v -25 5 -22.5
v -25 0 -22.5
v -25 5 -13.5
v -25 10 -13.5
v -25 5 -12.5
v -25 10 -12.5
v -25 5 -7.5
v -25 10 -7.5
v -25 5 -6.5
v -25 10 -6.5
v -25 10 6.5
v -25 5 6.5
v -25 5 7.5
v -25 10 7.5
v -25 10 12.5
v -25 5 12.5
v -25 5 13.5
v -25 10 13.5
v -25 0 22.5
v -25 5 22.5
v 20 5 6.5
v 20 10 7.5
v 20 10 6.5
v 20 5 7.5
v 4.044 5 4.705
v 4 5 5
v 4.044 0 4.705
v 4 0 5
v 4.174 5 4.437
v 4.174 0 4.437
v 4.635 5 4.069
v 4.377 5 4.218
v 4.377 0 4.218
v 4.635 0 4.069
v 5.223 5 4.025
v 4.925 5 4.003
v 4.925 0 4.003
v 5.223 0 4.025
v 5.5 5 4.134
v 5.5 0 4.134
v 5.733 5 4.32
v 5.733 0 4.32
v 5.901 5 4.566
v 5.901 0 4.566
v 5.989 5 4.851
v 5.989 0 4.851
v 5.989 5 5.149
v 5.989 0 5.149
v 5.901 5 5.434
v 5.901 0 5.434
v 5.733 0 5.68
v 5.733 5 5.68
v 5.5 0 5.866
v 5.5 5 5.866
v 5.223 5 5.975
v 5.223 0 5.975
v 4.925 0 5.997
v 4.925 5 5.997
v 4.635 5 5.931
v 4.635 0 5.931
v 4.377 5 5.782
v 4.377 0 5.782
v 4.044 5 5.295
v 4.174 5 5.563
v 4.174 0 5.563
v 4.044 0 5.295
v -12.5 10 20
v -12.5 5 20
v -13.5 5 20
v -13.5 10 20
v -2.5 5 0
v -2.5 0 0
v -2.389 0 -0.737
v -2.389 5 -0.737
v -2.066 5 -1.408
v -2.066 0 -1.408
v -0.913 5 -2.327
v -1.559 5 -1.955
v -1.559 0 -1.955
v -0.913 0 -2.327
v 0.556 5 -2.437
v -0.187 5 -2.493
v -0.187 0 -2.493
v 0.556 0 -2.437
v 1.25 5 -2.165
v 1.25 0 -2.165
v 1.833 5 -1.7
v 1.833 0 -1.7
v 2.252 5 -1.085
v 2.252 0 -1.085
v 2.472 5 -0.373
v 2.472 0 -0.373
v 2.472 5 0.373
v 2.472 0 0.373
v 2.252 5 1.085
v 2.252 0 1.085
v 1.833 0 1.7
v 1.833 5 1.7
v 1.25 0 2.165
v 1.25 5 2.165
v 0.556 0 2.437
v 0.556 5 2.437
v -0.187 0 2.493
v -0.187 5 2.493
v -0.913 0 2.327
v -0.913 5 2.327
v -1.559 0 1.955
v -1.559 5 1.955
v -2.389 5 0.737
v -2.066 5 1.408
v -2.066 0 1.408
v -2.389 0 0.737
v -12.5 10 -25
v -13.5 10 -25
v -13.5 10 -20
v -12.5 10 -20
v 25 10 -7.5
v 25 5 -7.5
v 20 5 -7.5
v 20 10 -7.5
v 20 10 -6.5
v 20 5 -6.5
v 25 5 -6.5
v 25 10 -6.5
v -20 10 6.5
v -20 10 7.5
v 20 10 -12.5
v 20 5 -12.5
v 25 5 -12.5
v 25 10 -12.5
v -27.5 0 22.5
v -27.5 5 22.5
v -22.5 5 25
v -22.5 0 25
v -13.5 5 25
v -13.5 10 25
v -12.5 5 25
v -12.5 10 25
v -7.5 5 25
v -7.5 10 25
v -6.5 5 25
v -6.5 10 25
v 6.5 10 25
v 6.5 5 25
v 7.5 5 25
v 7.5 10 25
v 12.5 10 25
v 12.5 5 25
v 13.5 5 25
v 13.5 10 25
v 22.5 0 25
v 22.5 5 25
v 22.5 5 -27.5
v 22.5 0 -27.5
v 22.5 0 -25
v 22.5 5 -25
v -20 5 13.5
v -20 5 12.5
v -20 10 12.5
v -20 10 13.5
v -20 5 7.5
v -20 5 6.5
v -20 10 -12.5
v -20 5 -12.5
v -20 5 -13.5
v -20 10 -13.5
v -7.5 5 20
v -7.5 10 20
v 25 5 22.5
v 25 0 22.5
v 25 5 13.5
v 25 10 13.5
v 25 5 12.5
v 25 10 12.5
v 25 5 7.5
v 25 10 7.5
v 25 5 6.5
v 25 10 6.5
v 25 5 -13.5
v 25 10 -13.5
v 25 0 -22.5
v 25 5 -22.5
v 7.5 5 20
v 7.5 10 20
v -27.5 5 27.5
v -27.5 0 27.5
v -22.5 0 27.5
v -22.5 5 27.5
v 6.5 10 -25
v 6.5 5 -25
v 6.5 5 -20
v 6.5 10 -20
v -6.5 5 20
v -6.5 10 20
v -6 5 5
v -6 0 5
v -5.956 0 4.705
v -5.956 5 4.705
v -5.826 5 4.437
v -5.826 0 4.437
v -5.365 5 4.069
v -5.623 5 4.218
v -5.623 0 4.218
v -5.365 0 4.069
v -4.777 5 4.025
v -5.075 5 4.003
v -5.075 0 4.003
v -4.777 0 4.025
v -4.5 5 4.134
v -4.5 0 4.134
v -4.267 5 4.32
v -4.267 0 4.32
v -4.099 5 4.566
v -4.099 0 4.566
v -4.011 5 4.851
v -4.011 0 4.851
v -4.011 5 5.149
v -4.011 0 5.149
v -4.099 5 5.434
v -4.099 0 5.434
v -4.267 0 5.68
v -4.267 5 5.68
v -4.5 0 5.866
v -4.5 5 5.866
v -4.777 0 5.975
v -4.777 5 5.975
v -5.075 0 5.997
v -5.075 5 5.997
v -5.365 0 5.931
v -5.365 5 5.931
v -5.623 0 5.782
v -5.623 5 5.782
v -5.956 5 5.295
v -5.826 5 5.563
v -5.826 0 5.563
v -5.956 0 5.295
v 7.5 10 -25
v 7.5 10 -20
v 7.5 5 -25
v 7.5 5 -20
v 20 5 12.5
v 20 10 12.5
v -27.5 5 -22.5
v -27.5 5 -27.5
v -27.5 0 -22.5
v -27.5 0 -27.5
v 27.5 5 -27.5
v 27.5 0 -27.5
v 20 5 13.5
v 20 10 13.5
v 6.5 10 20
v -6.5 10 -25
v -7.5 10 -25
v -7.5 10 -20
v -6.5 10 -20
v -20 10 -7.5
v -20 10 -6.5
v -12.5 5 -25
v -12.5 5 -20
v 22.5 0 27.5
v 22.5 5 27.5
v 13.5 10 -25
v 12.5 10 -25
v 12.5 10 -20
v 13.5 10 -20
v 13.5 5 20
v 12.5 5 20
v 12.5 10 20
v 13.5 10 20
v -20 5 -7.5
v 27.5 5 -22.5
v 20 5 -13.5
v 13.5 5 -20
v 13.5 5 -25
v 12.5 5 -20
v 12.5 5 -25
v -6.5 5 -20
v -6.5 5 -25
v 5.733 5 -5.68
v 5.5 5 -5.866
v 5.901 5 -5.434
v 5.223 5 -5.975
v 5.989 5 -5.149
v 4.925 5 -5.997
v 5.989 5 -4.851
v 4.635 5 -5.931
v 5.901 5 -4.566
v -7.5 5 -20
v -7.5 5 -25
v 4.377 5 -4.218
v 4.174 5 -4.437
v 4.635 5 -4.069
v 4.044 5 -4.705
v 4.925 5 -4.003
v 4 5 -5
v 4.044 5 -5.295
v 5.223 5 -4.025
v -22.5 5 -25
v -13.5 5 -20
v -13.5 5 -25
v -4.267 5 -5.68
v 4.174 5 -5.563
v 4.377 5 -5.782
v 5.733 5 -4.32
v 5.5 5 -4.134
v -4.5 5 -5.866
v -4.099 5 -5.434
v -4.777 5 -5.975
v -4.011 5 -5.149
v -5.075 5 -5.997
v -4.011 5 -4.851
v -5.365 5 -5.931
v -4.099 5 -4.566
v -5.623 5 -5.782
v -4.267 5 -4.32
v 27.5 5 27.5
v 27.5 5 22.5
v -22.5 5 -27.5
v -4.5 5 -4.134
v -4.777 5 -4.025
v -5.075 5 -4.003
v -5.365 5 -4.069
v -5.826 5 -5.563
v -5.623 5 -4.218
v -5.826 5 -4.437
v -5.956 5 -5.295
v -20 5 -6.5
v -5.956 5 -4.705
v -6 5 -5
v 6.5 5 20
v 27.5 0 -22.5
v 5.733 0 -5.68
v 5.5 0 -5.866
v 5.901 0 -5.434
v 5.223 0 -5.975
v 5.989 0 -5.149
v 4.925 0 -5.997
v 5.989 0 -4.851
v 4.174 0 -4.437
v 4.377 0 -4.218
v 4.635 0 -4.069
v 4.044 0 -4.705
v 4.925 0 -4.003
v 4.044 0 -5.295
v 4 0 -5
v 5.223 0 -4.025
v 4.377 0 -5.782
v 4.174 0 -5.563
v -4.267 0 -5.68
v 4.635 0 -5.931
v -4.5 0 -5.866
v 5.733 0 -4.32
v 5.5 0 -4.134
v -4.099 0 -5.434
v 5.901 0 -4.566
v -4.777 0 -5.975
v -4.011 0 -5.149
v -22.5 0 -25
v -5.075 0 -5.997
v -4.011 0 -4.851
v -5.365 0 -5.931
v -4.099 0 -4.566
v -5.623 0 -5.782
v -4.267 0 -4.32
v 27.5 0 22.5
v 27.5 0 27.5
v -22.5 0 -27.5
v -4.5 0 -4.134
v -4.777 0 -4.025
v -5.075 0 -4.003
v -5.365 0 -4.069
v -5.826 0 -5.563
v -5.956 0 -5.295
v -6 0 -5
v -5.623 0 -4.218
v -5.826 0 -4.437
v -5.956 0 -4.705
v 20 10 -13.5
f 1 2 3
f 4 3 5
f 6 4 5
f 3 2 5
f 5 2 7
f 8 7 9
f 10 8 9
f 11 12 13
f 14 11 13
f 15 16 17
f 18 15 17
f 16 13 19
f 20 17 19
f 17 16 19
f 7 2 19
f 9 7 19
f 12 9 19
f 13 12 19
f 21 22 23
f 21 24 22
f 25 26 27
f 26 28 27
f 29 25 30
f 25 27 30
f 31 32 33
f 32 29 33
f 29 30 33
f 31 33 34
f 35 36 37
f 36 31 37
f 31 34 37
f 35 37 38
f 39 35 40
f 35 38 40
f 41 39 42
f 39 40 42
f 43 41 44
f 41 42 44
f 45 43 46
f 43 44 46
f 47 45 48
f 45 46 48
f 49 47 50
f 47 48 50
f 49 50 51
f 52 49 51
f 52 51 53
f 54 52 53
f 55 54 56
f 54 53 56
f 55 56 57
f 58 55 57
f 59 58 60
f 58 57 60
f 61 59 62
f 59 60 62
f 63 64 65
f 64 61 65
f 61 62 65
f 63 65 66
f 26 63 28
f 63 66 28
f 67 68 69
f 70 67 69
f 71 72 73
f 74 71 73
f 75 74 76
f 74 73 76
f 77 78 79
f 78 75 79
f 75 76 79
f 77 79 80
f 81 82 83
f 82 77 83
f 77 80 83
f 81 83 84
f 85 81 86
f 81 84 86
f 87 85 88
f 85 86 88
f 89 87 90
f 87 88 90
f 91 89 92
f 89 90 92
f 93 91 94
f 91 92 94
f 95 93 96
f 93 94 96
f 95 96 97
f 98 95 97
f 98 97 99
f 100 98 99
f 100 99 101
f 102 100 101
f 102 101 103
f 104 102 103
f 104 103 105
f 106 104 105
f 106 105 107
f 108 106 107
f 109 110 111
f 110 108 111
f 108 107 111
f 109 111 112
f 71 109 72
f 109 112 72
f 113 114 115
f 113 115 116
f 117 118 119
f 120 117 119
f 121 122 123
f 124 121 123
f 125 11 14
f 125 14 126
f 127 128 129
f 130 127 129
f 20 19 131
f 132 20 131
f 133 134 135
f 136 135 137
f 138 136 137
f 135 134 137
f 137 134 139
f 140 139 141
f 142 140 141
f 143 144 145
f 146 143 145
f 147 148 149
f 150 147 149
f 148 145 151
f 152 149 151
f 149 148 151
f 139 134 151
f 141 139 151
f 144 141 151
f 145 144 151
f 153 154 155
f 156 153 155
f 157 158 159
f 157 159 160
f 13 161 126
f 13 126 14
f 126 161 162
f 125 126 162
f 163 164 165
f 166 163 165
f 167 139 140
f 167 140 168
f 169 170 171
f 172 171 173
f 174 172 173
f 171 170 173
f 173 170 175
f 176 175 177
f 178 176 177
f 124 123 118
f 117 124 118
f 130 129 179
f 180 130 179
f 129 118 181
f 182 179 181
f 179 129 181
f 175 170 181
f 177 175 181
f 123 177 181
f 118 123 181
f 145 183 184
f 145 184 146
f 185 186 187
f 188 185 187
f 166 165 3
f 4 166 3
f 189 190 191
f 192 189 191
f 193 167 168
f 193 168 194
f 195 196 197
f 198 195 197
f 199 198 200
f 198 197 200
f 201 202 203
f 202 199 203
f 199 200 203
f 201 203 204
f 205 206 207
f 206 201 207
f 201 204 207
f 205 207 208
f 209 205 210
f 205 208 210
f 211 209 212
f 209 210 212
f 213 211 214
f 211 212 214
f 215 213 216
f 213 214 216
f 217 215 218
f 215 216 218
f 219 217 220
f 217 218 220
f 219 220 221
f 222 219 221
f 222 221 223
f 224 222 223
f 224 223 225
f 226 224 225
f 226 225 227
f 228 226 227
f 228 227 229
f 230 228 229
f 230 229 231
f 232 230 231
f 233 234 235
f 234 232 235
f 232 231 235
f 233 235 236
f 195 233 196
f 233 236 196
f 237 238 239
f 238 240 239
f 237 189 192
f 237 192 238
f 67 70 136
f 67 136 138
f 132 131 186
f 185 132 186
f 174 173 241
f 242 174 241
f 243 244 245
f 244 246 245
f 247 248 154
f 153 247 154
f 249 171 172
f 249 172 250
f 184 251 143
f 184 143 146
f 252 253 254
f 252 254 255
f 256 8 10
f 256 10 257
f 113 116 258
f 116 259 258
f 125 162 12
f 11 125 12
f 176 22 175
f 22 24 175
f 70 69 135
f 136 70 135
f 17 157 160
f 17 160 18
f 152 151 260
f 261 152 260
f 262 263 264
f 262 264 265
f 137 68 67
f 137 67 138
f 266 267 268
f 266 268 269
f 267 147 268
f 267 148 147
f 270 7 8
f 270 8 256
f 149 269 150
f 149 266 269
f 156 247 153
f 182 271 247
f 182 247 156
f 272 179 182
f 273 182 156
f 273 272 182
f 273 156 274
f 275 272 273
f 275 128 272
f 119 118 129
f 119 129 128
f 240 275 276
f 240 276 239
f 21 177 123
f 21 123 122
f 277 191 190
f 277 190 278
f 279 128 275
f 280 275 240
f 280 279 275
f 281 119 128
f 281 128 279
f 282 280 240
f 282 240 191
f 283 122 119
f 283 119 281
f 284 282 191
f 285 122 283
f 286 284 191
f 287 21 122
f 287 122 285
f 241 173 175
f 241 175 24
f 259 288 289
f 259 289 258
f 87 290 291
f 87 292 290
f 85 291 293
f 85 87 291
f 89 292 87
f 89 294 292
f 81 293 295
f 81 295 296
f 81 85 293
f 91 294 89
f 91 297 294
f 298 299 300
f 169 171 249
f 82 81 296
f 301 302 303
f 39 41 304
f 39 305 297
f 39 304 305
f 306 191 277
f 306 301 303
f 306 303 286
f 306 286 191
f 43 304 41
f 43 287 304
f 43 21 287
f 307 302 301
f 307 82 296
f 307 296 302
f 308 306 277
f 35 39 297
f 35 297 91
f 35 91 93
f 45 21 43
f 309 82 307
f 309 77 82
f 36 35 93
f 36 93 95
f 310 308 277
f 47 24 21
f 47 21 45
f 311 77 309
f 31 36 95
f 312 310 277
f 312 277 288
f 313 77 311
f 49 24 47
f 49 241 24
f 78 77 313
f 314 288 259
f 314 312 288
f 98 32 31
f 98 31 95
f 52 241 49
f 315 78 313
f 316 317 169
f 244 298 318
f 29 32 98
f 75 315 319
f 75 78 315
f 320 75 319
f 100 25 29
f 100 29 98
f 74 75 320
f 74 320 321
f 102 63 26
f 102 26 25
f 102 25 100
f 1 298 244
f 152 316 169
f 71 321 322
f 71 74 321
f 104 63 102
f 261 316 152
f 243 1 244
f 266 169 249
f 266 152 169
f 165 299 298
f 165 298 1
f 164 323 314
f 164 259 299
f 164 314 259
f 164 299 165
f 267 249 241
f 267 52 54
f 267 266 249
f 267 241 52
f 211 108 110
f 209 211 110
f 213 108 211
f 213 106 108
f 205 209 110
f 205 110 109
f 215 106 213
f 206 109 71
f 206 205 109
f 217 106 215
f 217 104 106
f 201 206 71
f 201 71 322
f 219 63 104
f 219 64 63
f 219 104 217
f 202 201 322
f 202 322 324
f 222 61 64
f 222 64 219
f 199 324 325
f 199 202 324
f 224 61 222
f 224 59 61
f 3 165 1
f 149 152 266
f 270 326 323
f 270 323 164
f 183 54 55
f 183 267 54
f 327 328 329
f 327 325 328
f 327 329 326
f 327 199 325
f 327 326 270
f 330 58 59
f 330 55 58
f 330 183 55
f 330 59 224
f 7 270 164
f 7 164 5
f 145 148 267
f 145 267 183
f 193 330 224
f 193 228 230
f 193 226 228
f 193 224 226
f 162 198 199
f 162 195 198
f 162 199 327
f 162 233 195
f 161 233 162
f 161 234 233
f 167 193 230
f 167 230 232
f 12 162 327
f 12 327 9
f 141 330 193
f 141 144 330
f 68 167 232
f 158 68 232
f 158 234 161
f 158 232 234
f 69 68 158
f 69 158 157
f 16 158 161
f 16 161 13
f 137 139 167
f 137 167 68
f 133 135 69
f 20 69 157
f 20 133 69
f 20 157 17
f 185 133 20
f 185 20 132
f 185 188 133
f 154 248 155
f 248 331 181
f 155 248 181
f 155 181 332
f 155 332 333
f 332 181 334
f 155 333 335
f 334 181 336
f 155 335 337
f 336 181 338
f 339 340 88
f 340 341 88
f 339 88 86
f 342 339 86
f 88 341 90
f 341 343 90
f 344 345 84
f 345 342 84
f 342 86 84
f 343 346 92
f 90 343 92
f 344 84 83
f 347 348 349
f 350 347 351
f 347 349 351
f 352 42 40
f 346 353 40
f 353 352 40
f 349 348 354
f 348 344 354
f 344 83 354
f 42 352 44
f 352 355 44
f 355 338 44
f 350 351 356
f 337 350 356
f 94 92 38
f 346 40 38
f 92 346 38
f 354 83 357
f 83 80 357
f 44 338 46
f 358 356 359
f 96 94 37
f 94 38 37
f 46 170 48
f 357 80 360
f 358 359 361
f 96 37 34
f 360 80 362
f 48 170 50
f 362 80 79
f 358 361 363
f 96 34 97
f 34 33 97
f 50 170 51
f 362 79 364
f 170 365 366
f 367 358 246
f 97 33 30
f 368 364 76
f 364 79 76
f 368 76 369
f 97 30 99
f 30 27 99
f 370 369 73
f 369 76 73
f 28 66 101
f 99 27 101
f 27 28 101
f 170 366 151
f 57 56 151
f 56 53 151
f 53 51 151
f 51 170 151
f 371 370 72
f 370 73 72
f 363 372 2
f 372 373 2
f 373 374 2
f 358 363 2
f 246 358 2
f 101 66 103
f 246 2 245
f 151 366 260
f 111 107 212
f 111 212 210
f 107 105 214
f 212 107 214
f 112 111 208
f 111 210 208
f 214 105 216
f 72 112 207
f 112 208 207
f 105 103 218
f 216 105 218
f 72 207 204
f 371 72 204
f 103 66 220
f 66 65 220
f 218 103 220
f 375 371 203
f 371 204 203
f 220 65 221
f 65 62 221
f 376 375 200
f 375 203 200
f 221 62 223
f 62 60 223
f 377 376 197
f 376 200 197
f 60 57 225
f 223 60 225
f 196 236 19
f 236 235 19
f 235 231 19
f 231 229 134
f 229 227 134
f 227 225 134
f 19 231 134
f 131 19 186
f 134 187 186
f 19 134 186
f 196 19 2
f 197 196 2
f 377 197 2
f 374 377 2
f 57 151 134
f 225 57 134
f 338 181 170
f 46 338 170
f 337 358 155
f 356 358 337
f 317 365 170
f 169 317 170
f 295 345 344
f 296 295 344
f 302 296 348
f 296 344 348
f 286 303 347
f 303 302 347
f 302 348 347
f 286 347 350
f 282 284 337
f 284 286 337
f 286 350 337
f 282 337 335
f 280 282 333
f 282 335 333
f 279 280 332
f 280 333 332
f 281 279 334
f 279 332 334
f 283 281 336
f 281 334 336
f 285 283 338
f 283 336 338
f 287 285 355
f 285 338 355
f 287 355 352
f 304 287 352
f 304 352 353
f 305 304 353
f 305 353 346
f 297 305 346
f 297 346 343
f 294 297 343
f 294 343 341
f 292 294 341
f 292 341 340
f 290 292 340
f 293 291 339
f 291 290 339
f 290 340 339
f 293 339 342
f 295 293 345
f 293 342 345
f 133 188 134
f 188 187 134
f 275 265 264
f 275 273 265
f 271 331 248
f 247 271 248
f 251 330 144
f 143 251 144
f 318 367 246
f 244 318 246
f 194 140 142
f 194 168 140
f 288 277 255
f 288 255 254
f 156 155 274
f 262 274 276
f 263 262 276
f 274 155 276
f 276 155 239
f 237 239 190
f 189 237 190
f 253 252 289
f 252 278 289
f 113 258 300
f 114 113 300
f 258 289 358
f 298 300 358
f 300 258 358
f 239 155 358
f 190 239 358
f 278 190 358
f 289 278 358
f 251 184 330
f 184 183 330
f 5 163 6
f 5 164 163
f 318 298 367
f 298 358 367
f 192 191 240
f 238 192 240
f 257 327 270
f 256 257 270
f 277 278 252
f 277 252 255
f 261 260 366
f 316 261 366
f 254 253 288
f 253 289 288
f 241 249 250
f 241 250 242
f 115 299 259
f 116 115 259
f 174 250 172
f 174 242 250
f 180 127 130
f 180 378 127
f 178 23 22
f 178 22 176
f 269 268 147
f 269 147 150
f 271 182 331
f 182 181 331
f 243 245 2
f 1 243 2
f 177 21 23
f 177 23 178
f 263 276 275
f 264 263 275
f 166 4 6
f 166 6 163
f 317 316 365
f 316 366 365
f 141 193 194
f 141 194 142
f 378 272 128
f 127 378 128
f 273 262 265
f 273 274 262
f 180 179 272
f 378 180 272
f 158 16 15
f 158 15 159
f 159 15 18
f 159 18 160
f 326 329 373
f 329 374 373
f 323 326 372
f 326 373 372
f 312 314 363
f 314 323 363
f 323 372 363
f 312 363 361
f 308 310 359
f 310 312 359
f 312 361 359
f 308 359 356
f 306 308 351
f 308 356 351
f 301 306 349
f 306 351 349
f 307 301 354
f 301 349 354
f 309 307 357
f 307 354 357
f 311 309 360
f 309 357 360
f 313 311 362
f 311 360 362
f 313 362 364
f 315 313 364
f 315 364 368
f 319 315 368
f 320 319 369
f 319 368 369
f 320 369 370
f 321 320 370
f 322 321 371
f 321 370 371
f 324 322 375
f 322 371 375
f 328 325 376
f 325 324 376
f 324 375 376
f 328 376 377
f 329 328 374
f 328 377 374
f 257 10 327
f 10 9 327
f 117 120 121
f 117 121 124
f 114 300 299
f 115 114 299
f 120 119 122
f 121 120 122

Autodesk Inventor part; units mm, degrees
ref_plane "YZ Plane" through (0, 0, 0) normal (1, 0, 0) x (0, 1, 0)
ref_plane "XZ Plane" through (0, 0, 0) normal (0, 1, 0) x (-1, 0, 0)
ref_plane "XY Plane" through (0, 0, 0) normal (0, 0, 1) x (1, 0, 0)
sketch "Sketch1" plane through (0, 0, 0) normal (0, 1, 0) x (-1, 0, 0)
  line L0 (-25, -25) -> (25, -25)
  line L1 (25, -25) -> (25, 25)
  line L2 (25, 25) -> (-25, 25)
  line L3 (-25, 25) -> (-25, -25)
  line L4 (-25, -25) -> (25, 25) construction
  line L5 (25, -25) -> (-25, 25) construction
  circle A0 centre (0, 0) radius 2.5
  line L6 (-22.5, -22.5) -> (-27.5, -22.5)
  line L7 (-27.5, -22.5) -> (-27.5, -27.5)
  line L8 (-27.5, -27.5) -> (-22.5, -27.5)
  line L9 (-22.5, -27.5) -> (-22.5, -22.5)
  line L10 (-22.5, -22.5) -> (-27.5, -27.5) construction
  line L11 (-27.5, -22.5) -> (-22.5, -27.5) construction
  line L12 (27.5, -22.5) -> (22.5, -22.5)
  line L13 (22.5, -22.5) -> (22.5, -27.5)
  line L14 (22.5, -27.5) -> (27.5, -27.5)
  line L15 (27.5, -27.5) -> (27.5, -22.5)
  line L16 (27.5, -22.5) -> (22.5, -27.5) construction
  line L17 (22.5, -22.5) -> (27.5, -27.5) construction
  line L18 (27.5, 27.5) -> (22.5, 27.5)
  line L19 (22.5, 27.5) -> (22.5, 22.5)
  line L20 (22.5, 22.5) -> (27.5, 22.5)
  line L21 (27.5, 22.5) -> (27.5, 27.5)
  line L22 (27.5, 27.5) -> (22.5, 22.5) construction
  line L23 (22.5, 27.5) -> (27.5, 22.5) construction
  line L24 (-22.5, 27.5) -> (-27.5, 27.5)
  line L25 (-27.5, 27.5) -> (-27.5, 22.5)
  line L26 (-27.5, 22.5) -> (-22.5, 22.5)
  line L27 (-22.5, 22.5) -> (-22.5, 27.5)
  line L28 (-22.5, 27.5) -> (-27.5, 22.5) construction
  line L29 (-27.5, 27.5) -> (-22.5, 22.5) construction
  circle A1 centre (5, -5) radius 1
  circle A2 centre (5, 5) radius 1
  circle A3 centre (-5, 5) radius 1
  circle A4 centre (-5, -5) radius 1
  point P0 (25, -22.5)
  point P1 (22.5, -25)
  point P2 (-22.5, -25)
  point P3 (-25, -22.5)
  point P4 (-25, 22.5)
  point P5 (-22.5, 25)
  point P6 (22.5, 25)
  point P7 (25, 22.5)
  point P8 (0, -25)
  point P9 (25, 0)
  point P10 (0, 25)
  point P11 (-25, 0)
  dimension "d0" = 50
  dimension "d1" = 50
  dimension "d45" = 5
  dimension "d46" = 5
  dimension "d47" = 5
  dimension "d48" = 5
  dimension "d49" = 5
  dimension "d50" = 5
  dimension "d51" = 5
  dimension "d52" = 5
  dimension "d53" = 5
  dimension "d82" = 2
  dimension "d83" = 2
  dimension "d84" = 2
  dimension "d85" = 2
  dimension "d86" = 5
  dimension "d87" = 5
  dimension "d88" = 5
  dimension "d89" = 5
  dimension "d90" = 5
  dimension "d91" = 5
  dimension "d92" = 5
  dimension "d93" = 5
extrude "Extrusion1" add sketch "Sketch1" along normal blind 5
sketch "Sketch2" plane through (0, 5, 0) normal (0, 1, 0) x (1, 0, 0)
  line L0 (-25, 22.5) -> (-25, -22.5) projected
  line L1 (-22.5, -25) -> (22.5, -25) projected
  line L2 (25, -22.5) -> (25, 22.5) projected
  line L3 (22.5, 25) -> (-22.5, 25) projected
  line L4 (25, -12.5) -> (20, -12.5)
  line L5 (20, -12.5) -> (20, -7.5)
  line L6 (20, -7.5) -> (25, -7.5)
  line L7 (25, -7.5) -> (25, -12.5)
  line L8 (25, -22.5) -> (25, 22.5) projected
  line L9 (25, 7.5) -> (20, 7.5)
  line L10 (20, 7.5) -> (20, 12.5)
  line L11 (20, 12.5) -> (25, 12.5)
  line L12 (25, 12.5) -> (25, 7.5)
  line L13 (-25, -12.5) -> (-20, -12.5)
  line L14 (-20, -12.5) -> (-20, -7.5)
  line L15 (-20, -7.5) -> (-25, -7.5)
  line L16 (-25, -7.5) -> (-25, -12.5)
  line L17 (-25, 22.5) -> (-25, -22.5) projected
  line L18 (-25, 7.5) -> (-20, 7.5)
  line L19 (-20, 7.5) -> (-20, 12.5)
  line L20 (-20, 12.5) -> (-25, 12.5)
  line L21 (-25, 12.5) -> (-25, 7.5)
  line L22 (-22.5, -25) -> (22.5, -25) projected
  line L23 (-25, 12.5) -> (-20, 12.5)
  line L24 (-20, 12.5) -> (-20, 13.5)
  line L25 (-20, 13.5) -> (-25, 13.5)
  line L26 (-25, 13.5) -> (-25, 12.5)
  line L27 (20, 12.5) -> (25, 12.5)
  line L28 (25, 12.5) -> (25, 13.5)
  line L29 (25, 13.5) -> (20, 13.5)
  line L30 (20, 13.5) -> (20, 12.5)
  line L31 (25, 7.5) -> (20, 7.5)
  line L32 (20, 7.5) -> (20, 6.5)
  line L33 (20, 6.5) -> (25, 6.5)
  line L34 (25, 6.5) -> (25, 7.5)
  line L35 (-20, 7.5) -> (-25, 7.5)
  line L36 (-25, 7.5) -> (-25, 6.5)
  line L37 (-25, 6.5) -> (-20, 6.5)
  line L38 (-20, 6.5) -> (-20, 7.5)
  line L39 (-25, -7.5) -> (-20, -7.5)
  line L40 (-20, -7.5) -> (-20, -6.5)
  line L41 (-20, -6.5) -> (-25, -6.5)
  line L42 (-25, -6.5) -> (-25, -7.5)
  line L43 (-25, -12.5) -> (-20, -12.5)
  line L44 (-20, -12.5) -> (-20, -13.5)
  line L45 (-20, -13.5) -> (-25, -13.5)
  line L46 (-25, -13.5) -> (-25, -12.5)
  line L47 (25, -7.5) -> (20, -7.5)
  line L48 (20, -7.5) -> (20, -6.5)
  line L49 (20, -6.5) -> (25, -6.5)
  line L50 (25, -6.5) -> (25, -7.5)
  line L51 (20, -12.5) -> (25, -12.5)
  line L52 (25, -12.5) -> (25, -13.5)
  line L53 (25, -13.5) -> (20, -13.5)
  line L54 (20, -13.5) -> (20, -12.5)
  line L55 (-25, -22.5) -> (-27.5, -22.5) projected
  line L56 (-27.5, -22.5) -> (-27.5, -27.5) projected
  line L57 (-27.5, -27.5) -> (-22.5, -27.5) projected
  line L58 (-22.5, -27.5) -> (-22.5, -25) projected
  line L59 (22.5, -25) -> (22.5, -27.5) projected
  line L60 (22.5, -27.5) -> (27.5, -27.5) projected
  line L61 (27.5, -27.5) -> (27.5, -22.5) projected
  line L62 (27.5, -22.5) -> (25, -22.5) projected
  line L63 (25, 22.5) -> (27.5, 22.5) projected
  line L64 (27.5, 22.5) -> (27.5, 27.5) projected
  line L65 (27.5, 27.5) -> (22.5, 27.5) projected
  line L66 (22.5, 27.5) -> (22.5, 25) projected
  line L67 (-22.5, 25) -> (-22.5, 27.5) projected
  line L68 (-22.5, 27.5) -> (-27.5, 27.5) projected
  line L69 (-27.5, 27.5) -> (-27.5, 22.5) projected
  line L70 (-27.5, 22.5) -> (-25, 22.5) projected
  line L71 (-12.5, 25) -> (-7.5, 25)
  line L72 (-7.5, 25) -> (-7.5, 20)
  line L73 (-7.5, 20) -> (-12.5, 20)
  line L74 (-12.5, 20) -> (-12.5, 25)
  line L75 (7.5, 25) -> (12.5, 25)
  line L76 (12.5, 25) -> (12.5, 20)
  line L77 (12.5, 20) -> (7.5, 20)
  line L78 (7.5, 20) -> (7.5, 25)
  line L79 (-12.5, -25) -> (-7.5, -25)
  line L80 (-7.5, -25) -> (-7.5, -20)
  line L81 (-7.5, -20) -> (-12.5, -20)
  line L82 (-12.5, -20) -> (-12.5, -25)
  line L83 (7.5, -25) -> (12.5, -25)
  line L84 (12.5, -25) -> (12.5, -20)
  line L85 (12.5, -20) -> (7.5, -20)
  line L86 (7.5, -20) -> (7.5, -25)
  line L87 (22.5, 25) -> (-22.5, 25) projected
  line L88 (-12.5, -20) -> (-13.5, -20)
  line L89 (-13.5, -20) -> (-13.5, -25)
  line L90 (-13.5, -25) -> (-12.5, -25)
  line L91 (-12.5, -25) -> (-12.5, -20)
  line L92 (-7.5, -20) -> (-6.5, -20)
  line L93 (-6.5, -20) -> (-6.5, -25)
  line L94 (-6.5, -25) -> (-7.5, -25)
  line L95 (-7.5, -25) -> (-7.5, -20)
  line L96 (7.5, -20) -> (6.5, -20)
  line L97 (6.5, -20) -> (6.5, -25)
  line L98 (6.5, -25) -> (7.5, -25)
  line L99 (7.5, -25) -> (7.5, -20)
  line L100 (12.5, -20) -> (13.5, -20)
  line L101 (13.5, -20) -> (13.5, -25)
  line L102 (13.5, -25) -> (12.5, -25)
  line L103 (12.5, -25) -> (12.5, -20)
  line L104 (-7.5, 25) -> (-6.5, 25)
  line L105 (-6.5, 25) -> (-6.5, 20)
  line L106 (-6.5, 20) -> (-7.5, 20)
  line L107 (-7.5, 20) -> (-7.5, 25)
  line L108 (7.5, 25) -> (6.5, 25)
  line L109 (6.5, 25) -> (6.5, 20)
  line L110 (6.5, 20) -> (7.5, 20)
  line L111 (7.5, 20) -> (7.5, 25)
  line L112 (12.5, 25) -> (13.5, 25)
  line L113 (13.5, 25) -> (13.5, 20)
  line L114 (13.5, 20) -> (12.5, 20)
  line L115 (12.5, 20) -> (12.5, 25)
  line L116 (-12.5, 25) -> (-13.5, 25)
  line L117 (-13.5, 25) -> (-13.5, 20)
  line L118 (-13.5, 20) -> (-12.5, 20)
  line L119 (-12.5, 20) -> (-12.5, 25)
  point P0 (0, 0)
  point P1 (-25, 25)
  point P2 (-25, -25)
  point P3 (25, -25)
  point P4 (25, 25)
  point P5 (20, -10)
  point P6 (20, 10)
  point P7 (-25, 10)
  point P8 (-25, -10)
  point P9 (-25, 6.5)
  point P10 (-25, 13.5)
  point P11 (25, 13.5)
  point P12 (25, 6.5)
  point P13 (25, -13.5)
  point P14 (-25, -13.5)
  point P15 (25, 10)
  point P16 (-25, 0)
  point P17 (0, -25)
  point P18 (-10, -25)
  point P19 (10, -25)
  point P20 (0, 25)
  point P21 (10, 25)
  point P22 (-10, 25)
  point P23 (0, 25)
  dimension "d9" = 5
  dimension "d10" = 5
  dimension "d11" = 5
  dimension "d12" = 5
  dimension "d13" = 5
  dimension "d14" = 5
  dimension "d15" = 5
  dimension "d16" = 5
  dimension "d21" = 5
  dimension "d22" = 1
  dimension "d23" = 5
  dimension "d24" = 1
  dimension "d25" = 5
  dimension "d26" = 1
  dimension "d27" = 5
  dimension "d28" = 1
  dimension "d29" = 5
  dimension "d30" = 1
  dimension "d31" = 5
  dimension "d32" = 1
  dimension "d33" = 5
  dimension "d34" = 1
  dimension "d35" = 5
  dimension "d36" = 1
  dimension "d43" = 10
  dimension "d54" = 5
  dimension "d55" = 5
  dimension "d56" = 5
  dimension "d57" = 5
  dimension "d58" = 5
  dimension "d59" = 5
  dimension "d60" = 5
  dimension "d61" = 5
  dimension "d62" = 10
  dimension "d63" = 10
  dimension "d64" = 10
  dimension "d65" = 10
  dimension "d66" = 1
  dimension "d67" = 5
  dimension "d68" = 1
  dimension "d69" = 5
  dimension "d70" = 1
  dimension "d71" = 5
  dimension "d72" = 1
  dimension "d73" = 5
  dimension "d74" = 1
  dimension "d75" = 5
  dimension "d76" = 1
  dimension "d77" = 5
  dimension "d78" = 1
  dimension "d79" = 5
  dimension "d80" = 1
  dimension "d81" = 5
extrude "Extrusion2" add sketch "Sketch2" along normal blind 5 contours L25 L24 L20 L0 | L18 L38 L37 L0 | L41 L40 L15 L0 | L3 L74 L118 L117 | L13 L44 L45 L0 | L3 L105 L106 L72 | L3 L78 L110 L109 | L3 L113 L114 L76 | L89 L88 L82 L1 | L80 L92 L93 L1 | L97 L96 L86 L1 | L2 L11 L30 L29 | L84 L100 L101 L1 | L2 L33 L32 L9 | L2 L6 L48 L49 | L2 L53 L54 L4
equation "\"BendRadius\" = Thickness"
equation "\"BendReliefWidth\" = Thickness"
equation "\"BendReliefDepth\" = 0.5 * Thickness"
equation "\"CornerReliefSize\" = 4 * Thickness"
equation "\"MinimumRemnant\" = 2 * Thickness"
equation "\"TransitionRadius\" = BendRadius"
equation "\"JacobiRadiusSize\" = BendRadius"
equation "\"GapSize\" = Thickness"
equation "\"Thickness\" = 3.048"
properties part number "base"
